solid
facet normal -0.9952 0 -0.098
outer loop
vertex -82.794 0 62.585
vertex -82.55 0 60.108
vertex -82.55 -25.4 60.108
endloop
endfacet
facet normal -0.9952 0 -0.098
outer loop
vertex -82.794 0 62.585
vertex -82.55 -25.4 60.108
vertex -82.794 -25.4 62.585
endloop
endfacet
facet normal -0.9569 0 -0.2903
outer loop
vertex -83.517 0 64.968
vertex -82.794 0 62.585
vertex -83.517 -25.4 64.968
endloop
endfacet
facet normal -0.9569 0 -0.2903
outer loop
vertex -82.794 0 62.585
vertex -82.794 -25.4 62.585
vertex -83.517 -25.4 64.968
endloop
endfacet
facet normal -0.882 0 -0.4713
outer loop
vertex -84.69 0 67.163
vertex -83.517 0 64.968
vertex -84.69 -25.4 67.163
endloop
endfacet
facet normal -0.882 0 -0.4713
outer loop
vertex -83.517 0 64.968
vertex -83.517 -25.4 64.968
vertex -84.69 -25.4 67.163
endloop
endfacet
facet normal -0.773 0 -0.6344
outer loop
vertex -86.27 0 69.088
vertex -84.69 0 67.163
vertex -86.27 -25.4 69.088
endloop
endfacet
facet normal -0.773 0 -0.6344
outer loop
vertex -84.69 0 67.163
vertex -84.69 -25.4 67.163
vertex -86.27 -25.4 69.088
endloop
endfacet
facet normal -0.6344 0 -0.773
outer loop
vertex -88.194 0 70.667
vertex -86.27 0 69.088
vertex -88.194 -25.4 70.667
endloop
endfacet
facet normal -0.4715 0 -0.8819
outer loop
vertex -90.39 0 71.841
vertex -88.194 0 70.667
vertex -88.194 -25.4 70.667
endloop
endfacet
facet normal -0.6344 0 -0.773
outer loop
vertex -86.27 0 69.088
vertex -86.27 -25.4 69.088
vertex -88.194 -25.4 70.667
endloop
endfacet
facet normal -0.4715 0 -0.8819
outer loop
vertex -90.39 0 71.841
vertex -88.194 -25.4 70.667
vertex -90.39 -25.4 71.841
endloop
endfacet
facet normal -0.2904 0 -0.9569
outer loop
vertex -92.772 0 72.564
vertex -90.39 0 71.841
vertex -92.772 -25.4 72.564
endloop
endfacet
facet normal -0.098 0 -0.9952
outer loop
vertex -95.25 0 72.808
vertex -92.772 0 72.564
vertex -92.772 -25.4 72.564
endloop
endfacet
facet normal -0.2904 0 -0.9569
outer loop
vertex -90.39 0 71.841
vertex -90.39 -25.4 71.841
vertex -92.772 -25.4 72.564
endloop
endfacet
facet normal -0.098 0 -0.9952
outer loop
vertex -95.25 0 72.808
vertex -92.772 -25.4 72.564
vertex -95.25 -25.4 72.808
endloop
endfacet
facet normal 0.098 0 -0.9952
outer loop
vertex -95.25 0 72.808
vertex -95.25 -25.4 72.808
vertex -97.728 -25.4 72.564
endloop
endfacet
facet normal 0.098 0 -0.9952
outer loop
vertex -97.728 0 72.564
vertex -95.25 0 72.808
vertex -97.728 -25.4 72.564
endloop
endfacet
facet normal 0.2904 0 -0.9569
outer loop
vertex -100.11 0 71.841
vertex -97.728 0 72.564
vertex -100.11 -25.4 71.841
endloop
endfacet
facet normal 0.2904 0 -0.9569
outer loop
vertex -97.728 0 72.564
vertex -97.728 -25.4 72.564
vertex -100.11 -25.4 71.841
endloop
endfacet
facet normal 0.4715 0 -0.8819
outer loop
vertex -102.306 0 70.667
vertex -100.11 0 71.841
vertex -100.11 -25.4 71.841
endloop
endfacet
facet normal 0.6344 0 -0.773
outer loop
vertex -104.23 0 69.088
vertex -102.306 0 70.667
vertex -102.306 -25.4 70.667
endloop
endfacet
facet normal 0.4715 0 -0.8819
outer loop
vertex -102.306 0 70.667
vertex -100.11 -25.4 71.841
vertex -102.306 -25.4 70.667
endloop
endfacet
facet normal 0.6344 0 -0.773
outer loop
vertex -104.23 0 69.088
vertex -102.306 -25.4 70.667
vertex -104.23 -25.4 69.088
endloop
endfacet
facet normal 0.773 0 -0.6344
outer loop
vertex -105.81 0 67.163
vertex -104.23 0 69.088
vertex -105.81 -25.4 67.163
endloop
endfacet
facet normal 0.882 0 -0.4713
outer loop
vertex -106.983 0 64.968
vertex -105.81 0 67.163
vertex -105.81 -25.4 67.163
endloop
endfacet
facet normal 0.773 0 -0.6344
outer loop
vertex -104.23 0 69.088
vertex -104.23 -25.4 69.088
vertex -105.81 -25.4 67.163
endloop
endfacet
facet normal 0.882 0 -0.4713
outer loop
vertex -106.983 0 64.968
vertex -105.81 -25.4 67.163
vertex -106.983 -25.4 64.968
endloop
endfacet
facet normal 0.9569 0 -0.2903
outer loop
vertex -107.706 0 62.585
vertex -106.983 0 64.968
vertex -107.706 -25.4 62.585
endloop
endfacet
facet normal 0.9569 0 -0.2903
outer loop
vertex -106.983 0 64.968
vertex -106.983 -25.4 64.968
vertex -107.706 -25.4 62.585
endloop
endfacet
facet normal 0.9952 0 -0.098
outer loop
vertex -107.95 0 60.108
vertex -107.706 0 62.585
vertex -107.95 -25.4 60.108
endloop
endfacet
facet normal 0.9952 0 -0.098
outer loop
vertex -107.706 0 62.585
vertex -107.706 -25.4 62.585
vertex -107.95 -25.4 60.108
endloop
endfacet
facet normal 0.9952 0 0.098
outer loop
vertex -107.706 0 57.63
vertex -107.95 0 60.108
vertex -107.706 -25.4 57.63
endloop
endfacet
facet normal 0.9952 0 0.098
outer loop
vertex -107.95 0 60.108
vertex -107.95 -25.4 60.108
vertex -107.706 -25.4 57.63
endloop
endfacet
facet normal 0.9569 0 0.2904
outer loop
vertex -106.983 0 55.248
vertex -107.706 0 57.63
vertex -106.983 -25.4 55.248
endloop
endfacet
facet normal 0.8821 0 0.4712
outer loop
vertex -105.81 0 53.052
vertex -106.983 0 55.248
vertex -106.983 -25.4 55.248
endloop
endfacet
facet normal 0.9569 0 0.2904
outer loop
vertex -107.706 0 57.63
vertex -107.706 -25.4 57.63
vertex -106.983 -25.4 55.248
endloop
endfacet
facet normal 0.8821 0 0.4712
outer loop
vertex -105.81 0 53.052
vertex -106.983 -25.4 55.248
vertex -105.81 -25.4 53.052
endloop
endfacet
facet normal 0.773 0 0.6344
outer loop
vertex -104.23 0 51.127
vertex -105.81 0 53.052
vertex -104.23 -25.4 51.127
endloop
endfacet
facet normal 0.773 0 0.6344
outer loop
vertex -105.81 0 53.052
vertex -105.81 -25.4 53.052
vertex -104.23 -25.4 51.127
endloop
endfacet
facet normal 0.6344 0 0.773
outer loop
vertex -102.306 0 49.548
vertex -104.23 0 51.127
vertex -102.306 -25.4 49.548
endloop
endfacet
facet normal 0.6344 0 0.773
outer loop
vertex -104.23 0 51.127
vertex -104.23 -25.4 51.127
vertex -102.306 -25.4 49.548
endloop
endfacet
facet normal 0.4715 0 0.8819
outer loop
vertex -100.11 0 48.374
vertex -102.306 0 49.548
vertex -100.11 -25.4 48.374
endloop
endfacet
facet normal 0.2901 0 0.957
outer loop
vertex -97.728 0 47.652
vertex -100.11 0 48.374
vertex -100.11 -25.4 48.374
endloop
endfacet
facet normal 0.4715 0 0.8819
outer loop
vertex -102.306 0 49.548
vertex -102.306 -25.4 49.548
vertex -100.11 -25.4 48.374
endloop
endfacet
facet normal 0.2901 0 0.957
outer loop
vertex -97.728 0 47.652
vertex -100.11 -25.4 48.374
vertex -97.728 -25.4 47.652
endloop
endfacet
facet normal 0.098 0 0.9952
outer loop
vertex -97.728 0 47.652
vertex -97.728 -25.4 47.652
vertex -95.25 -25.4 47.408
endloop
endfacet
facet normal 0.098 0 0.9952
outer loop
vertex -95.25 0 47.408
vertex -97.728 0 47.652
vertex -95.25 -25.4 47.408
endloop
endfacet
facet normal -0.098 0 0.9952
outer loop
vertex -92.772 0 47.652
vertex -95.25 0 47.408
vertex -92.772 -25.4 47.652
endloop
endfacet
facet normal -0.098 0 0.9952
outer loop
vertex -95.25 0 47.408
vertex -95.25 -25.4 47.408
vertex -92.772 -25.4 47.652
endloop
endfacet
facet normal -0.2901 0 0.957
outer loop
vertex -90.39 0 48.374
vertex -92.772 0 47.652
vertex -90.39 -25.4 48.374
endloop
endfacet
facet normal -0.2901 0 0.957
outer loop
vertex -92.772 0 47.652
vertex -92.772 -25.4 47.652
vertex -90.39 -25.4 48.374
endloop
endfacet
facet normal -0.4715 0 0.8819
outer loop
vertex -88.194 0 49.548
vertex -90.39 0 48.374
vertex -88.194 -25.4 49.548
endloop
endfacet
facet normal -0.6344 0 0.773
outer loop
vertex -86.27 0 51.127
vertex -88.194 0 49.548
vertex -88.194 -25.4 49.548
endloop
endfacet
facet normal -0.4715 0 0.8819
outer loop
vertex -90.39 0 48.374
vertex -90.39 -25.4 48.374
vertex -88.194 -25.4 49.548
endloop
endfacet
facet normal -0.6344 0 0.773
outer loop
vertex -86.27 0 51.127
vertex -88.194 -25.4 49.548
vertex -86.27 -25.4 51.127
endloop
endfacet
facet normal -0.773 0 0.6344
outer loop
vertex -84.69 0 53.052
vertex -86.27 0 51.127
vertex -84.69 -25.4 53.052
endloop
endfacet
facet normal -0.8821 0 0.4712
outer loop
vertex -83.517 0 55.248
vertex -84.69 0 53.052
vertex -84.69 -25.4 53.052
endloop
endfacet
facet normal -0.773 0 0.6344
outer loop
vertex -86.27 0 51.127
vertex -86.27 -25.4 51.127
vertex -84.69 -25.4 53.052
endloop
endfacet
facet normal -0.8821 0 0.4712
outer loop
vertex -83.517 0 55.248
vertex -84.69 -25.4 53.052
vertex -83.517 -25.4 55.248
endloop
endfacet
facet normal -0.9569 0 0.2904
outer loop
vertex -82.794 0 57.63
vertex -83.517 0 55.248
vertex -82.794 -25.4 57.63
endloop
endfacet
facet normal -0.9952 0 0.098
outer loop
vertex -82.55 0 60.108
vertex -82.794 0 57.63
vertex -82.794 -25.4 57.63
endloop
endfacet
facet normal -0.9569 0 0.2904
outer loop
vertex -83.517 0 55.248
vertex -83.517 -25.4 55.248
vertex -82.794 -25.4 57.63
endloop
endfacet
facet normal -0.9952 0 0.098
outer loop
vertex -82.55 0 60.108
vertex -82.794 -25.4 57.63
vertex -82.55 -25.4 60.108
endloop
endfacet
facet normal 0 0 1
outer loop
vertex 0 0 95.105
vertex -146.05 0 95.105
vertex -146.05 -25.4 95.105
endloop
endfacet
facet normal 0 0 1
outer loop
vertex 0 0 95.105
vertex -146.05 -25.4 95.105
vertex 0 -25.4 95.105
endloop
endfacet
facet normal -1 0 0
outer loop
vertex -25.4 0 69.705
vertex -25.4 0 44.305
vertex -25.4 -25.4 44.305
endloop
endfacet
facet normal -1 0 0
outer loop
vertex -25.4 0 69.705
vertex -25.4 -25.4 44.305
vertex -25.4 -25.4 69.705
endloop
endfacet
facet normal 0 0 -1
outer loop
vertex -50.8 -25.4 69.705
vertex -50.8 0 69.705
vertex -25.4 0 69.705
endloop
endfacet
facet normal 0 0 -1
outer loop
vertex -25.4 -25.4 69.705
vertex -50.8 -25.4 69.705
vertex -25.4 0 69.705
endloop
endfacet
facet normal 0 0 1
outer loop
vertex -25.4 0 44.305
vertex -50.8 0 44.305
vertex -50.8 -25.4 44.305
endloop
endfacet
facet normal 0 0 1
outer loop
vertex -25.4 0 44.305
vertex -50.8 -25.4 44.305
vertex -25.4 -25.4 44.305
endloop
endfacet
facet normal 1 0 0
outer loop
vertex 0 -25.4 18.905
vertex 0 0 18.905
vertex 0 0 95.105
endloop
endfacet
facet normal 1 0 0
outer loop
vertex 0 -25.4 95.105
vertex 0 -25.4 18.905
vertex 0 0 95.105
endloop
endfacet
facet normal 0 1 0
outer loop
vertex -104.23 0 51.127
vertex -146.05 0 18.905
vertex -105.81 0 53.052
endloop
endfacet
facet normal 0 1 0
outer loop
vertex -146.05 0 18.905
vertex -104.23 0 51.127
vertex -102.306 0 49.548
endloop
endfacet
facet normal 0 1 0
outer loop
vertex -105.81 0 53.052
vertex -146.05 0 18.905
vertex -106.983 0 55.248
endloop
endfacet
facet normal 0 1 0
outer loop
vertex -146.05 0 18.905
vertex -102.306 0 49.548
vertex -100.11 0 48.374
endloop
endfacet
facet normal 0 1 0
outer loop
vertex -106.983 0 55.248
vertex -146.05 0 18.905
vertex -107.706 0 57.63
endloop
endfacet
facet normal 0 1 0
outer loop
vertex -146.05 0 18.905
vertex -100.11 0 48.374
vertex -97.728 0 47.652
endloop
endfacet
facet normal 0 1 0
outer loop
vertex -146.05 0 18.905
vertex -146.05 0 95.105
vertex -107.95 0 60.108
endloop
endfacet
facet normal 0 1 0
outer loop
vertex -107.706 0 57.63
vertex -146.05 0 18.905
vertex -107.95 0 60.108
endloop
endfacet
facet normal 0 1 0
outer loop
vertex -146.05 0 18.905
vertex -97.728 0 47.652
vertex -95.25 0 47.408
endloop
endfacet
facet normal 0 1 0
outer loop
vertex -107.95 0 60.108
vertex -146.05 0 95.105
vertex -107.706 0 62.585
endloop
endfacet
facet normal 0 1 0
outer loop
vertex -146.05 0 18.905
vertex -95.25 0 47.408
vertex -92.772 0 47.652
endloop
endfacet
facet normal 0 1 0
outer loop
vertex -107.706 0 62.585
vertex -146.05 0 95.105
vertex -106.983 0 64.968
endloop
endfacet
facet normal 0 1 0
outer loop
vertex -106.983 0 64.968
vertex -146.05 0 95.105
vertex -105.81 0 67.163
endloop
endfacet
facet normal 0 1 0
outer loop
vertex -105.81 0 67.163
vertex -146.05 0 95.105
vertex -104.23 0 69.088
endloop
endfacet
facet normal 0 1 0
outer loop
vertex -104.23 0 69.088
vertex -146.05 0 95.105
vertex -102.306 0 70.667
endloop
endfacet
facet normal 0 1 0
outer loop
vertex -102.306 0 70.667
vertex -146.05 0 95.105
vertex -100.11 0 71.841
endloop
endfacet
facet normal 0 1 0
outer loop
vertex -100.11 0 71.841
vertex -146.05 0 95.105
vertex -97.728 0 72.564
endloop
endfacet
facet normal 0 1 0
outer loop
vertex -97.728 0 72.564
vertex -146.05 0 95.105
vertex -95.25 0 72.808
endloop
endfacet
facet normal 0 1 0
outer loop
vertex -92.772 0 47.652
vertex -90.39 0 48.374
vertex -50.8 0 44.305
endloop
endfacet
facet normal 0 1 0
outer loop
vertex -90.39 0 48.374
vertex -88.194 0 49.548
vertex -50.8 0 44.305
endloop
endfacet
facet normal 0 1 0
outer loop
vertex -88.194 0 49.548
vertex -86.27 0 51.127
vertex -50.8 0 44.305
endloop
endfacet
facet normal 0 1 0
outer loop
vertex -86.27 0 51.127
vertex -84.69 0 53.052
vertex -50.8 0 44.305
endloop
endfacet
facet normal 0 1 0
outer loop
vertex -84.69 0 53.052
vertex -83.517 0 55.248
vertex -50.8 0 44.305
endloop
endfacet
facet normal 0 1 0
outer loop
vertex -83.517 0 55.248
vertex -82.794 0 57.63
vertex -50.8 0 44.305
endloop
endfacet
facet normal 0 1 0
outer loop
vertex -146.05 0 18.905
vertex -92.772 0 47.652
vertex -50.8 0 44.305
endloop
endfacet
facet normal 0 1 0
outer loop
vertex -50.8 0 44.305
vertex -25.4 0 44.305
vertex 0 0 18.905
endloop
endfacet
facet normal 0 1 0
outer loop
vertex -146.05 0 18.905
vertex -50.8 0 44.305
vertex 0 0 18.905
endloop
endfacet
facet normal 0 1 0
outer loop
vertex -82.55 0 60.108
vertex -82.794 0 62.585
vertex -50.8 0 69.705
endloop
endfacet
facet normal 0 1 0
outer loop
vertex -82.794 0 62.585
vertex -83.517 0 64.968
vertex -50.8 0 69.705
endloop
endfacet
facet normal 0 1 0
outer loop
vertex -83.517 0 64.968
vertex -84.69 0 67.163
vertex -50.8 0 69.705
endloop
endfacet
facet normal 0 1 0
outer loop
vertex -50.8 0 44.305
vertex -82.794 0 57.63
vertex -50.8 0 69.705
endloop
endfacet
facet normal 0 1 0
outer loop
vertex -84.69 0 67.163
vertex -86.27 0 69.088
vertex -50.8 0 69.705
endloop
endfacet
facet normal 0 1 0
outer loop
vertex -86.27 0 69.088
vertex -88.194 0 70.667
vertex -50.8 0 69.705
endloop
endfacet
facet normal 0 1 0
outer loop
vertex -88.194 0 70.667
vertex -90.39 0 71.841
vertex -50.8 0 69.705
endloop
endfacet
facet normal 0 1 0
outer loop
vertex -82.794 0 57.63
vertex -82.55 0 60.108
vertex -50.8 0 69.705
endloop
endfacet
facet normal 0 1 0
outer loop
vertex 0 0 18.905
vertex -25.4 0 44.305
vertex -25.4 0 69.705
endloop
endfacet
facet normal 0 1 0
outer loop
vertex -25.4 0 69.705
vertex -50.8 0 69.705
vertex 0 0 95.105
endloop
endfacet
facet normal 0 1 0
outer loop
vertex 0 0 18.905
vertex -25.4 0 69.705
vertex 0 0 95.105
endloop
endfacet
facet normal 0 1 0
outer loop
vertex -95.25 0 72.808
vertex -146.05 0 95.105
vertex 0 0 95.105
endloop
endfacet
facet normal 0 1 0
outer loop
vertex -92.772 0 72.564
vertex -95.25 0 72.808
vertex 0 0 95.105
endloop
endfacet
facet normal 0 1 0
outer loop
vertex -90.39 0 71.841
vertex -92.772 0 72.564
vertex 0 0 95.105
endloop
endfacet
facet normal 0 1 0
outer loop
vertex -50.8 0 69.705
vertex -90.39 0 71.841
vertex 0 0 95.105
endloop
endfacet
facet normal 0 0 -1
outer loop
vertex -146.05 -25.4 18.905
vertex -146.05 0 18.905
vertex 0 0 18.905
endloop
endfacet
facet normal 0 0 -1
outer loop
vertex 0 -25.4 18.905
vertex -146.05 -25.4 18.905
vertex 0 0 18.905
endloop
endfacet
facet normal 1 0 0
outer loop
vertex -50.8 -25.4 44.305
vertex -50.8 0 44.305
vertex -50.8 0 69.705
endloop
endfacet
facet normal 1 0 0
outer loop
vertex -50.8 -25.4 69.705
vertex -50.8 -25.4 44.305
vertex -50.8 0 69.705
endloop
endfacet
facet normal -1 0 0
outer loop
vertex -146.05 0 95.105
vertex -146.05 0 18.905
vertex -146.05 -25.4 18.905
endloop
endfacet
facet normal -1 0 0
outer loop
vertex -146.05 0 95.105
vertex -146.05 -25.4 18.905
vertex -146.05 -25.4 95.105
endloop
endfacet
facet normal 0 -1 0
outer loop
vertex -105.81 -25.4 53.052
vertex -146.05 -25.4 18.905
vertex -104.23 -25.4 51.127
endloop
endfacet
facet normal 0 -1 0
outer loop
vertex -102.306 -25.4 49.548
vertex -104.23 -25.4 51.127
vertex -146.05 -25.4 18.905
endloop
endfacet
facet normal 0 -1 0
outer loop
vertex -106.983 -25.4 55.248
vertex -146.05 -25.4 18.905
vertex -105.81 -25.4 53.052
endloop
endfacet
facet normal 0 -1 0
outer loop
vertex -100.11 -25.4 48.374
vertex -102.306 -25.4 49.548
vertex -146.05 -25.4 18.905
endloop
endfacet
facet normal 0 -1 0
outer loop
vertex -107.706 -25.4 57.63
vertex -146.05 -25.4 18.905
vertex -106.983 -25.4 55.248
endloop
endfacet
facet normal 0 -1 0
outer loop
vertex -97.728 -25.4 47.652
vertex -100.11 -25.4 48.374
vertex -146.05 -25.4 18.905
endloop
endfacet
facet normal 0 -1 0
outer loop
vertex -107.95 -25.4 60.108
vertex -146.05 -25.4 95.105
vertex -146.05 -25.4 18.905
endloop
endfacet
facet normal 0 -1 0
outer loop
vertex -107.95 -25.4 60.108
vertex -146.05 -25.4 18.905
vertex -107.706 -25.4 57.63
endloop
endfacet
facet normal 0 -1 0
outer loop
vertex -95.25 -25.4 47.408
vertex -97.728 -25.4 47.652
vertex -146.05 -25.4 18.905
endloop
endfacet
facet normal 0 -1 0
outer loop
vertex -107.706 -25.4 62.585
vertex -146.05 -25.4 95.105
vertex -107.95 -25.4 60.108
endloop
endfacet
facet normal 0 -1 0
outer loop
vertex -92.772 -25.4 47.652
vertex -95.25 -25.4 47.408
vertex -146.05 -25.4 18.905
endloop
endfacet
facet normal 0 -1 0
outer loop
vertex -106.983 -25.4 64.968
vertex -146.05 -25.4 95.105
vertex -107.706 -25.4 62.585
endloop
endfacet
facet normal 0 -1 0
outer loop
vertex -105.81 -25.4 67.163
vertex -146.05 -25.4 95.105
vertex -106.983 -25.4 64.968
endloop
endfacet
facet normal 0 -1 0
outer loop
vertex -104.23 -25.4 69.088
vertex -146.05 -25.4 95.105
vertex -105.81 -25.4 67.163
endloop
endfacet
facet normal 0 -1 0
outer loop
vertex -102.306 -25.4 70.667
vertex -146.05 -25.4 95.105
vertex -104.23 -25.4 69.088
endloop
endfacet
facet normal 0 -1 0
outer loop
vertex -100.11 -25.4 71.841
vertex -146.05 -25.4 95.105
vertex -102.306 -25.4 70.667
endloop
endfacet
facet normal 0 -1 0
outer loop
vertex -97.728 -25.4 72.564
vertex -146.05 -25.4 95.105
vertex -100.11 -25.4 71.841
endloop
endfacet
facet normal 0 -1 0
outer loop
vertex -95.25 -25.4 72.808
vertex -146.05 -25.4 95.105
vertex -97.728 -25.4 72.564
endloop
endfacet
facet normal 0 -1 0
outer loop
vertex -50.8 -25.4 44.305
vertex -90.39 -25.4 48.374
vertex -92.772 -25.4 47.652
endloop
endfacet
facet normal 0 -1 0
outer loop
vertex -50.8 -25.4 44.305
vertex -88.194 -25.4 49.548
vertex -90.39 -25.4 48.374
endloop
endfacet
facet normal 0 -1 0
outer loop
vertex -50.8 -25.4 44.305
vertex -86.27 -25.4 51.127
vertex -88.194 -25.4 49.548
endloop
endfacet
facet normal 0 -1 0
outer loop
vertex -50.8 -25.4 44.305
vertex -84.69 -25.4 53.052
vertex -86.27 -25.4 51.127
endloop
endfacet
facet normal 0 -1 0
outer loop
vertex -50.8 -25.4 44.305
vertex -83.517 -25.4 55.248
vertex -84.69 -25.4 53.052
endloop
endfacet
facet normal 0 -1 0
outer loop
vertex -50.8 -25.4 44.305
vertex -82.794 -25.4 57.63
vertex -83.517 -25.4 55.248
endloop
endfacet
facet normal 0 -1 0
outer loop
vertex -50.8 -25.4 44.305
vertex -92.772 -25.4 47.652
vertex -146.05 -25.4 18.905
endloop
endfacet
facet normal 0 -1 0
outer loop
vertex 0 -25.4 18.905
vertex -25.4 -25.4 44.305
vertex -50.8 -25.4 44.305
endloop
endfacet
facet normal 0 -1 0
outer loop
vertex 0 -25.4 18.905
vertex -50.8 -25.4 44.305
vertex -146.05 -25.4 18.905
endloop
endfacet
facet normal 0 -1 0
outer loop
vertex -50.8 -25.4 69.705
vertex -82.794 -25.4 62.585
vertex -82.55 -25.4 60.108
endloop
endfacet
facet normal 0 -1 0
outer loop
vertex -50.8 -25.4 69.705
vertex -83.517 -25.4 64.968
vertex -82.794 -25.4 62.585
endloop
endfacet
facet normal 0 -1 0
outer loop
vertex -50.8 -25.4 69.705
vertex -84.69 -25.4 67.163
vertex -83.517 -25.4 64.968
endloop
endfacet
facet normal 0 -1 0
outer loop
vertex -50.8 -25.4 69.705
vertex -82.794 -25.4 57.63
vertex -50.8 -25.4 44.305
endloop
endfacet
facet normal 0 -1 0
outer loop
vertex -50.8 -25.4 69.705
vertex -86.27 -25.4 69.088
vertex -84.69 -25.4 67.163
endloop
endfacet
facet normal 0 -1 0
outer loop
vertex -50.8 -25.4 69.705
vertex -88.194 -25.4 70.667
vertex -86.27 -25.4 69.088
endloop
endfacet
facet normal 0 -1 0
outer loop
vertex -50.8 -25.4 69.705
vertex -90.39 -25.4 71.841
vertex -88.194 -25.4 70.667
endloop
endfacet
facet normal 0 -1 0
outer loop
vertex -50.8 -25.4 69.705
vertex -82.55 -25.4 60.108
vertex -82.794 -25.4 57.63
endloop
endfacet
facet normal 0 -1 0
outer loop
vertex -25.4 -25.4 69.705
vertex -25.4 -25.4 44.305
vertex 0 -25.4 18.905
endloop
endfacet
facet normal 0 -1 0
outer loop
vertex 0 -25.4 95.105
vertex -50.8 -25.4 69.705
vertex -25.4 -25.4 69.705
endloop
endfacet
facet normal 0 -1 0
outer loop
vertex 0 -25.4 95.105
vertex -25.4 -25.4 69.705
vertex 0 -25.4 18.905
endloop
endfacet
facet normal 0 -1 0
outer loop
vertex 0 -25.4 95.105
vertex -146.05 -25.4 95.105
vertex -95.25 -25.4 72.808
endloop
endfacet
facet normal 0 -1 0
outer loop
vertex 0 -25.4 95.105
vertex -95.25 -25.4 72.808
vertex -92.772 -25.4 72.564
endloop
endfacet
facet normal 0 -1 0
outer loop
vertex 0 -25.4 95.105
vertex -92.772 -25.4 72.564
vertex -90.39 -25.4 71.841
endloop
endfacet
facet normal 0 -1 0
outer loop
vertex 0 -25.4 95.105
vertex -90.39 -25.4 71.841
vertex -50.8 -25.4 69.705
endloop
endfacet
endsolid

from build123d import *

# Parameters (mm, degrees)
F0_W     = 146.05
F0_H     = 76.2
F1_DEPTH = 25.4
F3_R     = 12.7
F3_W     = 25.4
F3_H     = 25.4
F4_DEPTH = 25.4


with BuildPart() as f1:
    # F0 (on Front) → F1 (new body)
    with BuildSketch(Plane.XZ):
        with Locations((-73.025, 57.004511)):
            Rectangle(F0_W, F0_H)
    extrude(amount=F1_DEPTH)

    # F3 (on face) → F4 (cut)
    with BuildSketch(Plane.XZ.offset(25.4)):
        with Locations((-95.25, 60.107693)):
            Circle(F3_R)
        with Locations((-38.1, 57.004511)):
            Rectangle(F3_W, F3_H)
    extrude(amount=-F4_DEPTH, mode=Mode.SUBTRACT)


solid = f1.part
